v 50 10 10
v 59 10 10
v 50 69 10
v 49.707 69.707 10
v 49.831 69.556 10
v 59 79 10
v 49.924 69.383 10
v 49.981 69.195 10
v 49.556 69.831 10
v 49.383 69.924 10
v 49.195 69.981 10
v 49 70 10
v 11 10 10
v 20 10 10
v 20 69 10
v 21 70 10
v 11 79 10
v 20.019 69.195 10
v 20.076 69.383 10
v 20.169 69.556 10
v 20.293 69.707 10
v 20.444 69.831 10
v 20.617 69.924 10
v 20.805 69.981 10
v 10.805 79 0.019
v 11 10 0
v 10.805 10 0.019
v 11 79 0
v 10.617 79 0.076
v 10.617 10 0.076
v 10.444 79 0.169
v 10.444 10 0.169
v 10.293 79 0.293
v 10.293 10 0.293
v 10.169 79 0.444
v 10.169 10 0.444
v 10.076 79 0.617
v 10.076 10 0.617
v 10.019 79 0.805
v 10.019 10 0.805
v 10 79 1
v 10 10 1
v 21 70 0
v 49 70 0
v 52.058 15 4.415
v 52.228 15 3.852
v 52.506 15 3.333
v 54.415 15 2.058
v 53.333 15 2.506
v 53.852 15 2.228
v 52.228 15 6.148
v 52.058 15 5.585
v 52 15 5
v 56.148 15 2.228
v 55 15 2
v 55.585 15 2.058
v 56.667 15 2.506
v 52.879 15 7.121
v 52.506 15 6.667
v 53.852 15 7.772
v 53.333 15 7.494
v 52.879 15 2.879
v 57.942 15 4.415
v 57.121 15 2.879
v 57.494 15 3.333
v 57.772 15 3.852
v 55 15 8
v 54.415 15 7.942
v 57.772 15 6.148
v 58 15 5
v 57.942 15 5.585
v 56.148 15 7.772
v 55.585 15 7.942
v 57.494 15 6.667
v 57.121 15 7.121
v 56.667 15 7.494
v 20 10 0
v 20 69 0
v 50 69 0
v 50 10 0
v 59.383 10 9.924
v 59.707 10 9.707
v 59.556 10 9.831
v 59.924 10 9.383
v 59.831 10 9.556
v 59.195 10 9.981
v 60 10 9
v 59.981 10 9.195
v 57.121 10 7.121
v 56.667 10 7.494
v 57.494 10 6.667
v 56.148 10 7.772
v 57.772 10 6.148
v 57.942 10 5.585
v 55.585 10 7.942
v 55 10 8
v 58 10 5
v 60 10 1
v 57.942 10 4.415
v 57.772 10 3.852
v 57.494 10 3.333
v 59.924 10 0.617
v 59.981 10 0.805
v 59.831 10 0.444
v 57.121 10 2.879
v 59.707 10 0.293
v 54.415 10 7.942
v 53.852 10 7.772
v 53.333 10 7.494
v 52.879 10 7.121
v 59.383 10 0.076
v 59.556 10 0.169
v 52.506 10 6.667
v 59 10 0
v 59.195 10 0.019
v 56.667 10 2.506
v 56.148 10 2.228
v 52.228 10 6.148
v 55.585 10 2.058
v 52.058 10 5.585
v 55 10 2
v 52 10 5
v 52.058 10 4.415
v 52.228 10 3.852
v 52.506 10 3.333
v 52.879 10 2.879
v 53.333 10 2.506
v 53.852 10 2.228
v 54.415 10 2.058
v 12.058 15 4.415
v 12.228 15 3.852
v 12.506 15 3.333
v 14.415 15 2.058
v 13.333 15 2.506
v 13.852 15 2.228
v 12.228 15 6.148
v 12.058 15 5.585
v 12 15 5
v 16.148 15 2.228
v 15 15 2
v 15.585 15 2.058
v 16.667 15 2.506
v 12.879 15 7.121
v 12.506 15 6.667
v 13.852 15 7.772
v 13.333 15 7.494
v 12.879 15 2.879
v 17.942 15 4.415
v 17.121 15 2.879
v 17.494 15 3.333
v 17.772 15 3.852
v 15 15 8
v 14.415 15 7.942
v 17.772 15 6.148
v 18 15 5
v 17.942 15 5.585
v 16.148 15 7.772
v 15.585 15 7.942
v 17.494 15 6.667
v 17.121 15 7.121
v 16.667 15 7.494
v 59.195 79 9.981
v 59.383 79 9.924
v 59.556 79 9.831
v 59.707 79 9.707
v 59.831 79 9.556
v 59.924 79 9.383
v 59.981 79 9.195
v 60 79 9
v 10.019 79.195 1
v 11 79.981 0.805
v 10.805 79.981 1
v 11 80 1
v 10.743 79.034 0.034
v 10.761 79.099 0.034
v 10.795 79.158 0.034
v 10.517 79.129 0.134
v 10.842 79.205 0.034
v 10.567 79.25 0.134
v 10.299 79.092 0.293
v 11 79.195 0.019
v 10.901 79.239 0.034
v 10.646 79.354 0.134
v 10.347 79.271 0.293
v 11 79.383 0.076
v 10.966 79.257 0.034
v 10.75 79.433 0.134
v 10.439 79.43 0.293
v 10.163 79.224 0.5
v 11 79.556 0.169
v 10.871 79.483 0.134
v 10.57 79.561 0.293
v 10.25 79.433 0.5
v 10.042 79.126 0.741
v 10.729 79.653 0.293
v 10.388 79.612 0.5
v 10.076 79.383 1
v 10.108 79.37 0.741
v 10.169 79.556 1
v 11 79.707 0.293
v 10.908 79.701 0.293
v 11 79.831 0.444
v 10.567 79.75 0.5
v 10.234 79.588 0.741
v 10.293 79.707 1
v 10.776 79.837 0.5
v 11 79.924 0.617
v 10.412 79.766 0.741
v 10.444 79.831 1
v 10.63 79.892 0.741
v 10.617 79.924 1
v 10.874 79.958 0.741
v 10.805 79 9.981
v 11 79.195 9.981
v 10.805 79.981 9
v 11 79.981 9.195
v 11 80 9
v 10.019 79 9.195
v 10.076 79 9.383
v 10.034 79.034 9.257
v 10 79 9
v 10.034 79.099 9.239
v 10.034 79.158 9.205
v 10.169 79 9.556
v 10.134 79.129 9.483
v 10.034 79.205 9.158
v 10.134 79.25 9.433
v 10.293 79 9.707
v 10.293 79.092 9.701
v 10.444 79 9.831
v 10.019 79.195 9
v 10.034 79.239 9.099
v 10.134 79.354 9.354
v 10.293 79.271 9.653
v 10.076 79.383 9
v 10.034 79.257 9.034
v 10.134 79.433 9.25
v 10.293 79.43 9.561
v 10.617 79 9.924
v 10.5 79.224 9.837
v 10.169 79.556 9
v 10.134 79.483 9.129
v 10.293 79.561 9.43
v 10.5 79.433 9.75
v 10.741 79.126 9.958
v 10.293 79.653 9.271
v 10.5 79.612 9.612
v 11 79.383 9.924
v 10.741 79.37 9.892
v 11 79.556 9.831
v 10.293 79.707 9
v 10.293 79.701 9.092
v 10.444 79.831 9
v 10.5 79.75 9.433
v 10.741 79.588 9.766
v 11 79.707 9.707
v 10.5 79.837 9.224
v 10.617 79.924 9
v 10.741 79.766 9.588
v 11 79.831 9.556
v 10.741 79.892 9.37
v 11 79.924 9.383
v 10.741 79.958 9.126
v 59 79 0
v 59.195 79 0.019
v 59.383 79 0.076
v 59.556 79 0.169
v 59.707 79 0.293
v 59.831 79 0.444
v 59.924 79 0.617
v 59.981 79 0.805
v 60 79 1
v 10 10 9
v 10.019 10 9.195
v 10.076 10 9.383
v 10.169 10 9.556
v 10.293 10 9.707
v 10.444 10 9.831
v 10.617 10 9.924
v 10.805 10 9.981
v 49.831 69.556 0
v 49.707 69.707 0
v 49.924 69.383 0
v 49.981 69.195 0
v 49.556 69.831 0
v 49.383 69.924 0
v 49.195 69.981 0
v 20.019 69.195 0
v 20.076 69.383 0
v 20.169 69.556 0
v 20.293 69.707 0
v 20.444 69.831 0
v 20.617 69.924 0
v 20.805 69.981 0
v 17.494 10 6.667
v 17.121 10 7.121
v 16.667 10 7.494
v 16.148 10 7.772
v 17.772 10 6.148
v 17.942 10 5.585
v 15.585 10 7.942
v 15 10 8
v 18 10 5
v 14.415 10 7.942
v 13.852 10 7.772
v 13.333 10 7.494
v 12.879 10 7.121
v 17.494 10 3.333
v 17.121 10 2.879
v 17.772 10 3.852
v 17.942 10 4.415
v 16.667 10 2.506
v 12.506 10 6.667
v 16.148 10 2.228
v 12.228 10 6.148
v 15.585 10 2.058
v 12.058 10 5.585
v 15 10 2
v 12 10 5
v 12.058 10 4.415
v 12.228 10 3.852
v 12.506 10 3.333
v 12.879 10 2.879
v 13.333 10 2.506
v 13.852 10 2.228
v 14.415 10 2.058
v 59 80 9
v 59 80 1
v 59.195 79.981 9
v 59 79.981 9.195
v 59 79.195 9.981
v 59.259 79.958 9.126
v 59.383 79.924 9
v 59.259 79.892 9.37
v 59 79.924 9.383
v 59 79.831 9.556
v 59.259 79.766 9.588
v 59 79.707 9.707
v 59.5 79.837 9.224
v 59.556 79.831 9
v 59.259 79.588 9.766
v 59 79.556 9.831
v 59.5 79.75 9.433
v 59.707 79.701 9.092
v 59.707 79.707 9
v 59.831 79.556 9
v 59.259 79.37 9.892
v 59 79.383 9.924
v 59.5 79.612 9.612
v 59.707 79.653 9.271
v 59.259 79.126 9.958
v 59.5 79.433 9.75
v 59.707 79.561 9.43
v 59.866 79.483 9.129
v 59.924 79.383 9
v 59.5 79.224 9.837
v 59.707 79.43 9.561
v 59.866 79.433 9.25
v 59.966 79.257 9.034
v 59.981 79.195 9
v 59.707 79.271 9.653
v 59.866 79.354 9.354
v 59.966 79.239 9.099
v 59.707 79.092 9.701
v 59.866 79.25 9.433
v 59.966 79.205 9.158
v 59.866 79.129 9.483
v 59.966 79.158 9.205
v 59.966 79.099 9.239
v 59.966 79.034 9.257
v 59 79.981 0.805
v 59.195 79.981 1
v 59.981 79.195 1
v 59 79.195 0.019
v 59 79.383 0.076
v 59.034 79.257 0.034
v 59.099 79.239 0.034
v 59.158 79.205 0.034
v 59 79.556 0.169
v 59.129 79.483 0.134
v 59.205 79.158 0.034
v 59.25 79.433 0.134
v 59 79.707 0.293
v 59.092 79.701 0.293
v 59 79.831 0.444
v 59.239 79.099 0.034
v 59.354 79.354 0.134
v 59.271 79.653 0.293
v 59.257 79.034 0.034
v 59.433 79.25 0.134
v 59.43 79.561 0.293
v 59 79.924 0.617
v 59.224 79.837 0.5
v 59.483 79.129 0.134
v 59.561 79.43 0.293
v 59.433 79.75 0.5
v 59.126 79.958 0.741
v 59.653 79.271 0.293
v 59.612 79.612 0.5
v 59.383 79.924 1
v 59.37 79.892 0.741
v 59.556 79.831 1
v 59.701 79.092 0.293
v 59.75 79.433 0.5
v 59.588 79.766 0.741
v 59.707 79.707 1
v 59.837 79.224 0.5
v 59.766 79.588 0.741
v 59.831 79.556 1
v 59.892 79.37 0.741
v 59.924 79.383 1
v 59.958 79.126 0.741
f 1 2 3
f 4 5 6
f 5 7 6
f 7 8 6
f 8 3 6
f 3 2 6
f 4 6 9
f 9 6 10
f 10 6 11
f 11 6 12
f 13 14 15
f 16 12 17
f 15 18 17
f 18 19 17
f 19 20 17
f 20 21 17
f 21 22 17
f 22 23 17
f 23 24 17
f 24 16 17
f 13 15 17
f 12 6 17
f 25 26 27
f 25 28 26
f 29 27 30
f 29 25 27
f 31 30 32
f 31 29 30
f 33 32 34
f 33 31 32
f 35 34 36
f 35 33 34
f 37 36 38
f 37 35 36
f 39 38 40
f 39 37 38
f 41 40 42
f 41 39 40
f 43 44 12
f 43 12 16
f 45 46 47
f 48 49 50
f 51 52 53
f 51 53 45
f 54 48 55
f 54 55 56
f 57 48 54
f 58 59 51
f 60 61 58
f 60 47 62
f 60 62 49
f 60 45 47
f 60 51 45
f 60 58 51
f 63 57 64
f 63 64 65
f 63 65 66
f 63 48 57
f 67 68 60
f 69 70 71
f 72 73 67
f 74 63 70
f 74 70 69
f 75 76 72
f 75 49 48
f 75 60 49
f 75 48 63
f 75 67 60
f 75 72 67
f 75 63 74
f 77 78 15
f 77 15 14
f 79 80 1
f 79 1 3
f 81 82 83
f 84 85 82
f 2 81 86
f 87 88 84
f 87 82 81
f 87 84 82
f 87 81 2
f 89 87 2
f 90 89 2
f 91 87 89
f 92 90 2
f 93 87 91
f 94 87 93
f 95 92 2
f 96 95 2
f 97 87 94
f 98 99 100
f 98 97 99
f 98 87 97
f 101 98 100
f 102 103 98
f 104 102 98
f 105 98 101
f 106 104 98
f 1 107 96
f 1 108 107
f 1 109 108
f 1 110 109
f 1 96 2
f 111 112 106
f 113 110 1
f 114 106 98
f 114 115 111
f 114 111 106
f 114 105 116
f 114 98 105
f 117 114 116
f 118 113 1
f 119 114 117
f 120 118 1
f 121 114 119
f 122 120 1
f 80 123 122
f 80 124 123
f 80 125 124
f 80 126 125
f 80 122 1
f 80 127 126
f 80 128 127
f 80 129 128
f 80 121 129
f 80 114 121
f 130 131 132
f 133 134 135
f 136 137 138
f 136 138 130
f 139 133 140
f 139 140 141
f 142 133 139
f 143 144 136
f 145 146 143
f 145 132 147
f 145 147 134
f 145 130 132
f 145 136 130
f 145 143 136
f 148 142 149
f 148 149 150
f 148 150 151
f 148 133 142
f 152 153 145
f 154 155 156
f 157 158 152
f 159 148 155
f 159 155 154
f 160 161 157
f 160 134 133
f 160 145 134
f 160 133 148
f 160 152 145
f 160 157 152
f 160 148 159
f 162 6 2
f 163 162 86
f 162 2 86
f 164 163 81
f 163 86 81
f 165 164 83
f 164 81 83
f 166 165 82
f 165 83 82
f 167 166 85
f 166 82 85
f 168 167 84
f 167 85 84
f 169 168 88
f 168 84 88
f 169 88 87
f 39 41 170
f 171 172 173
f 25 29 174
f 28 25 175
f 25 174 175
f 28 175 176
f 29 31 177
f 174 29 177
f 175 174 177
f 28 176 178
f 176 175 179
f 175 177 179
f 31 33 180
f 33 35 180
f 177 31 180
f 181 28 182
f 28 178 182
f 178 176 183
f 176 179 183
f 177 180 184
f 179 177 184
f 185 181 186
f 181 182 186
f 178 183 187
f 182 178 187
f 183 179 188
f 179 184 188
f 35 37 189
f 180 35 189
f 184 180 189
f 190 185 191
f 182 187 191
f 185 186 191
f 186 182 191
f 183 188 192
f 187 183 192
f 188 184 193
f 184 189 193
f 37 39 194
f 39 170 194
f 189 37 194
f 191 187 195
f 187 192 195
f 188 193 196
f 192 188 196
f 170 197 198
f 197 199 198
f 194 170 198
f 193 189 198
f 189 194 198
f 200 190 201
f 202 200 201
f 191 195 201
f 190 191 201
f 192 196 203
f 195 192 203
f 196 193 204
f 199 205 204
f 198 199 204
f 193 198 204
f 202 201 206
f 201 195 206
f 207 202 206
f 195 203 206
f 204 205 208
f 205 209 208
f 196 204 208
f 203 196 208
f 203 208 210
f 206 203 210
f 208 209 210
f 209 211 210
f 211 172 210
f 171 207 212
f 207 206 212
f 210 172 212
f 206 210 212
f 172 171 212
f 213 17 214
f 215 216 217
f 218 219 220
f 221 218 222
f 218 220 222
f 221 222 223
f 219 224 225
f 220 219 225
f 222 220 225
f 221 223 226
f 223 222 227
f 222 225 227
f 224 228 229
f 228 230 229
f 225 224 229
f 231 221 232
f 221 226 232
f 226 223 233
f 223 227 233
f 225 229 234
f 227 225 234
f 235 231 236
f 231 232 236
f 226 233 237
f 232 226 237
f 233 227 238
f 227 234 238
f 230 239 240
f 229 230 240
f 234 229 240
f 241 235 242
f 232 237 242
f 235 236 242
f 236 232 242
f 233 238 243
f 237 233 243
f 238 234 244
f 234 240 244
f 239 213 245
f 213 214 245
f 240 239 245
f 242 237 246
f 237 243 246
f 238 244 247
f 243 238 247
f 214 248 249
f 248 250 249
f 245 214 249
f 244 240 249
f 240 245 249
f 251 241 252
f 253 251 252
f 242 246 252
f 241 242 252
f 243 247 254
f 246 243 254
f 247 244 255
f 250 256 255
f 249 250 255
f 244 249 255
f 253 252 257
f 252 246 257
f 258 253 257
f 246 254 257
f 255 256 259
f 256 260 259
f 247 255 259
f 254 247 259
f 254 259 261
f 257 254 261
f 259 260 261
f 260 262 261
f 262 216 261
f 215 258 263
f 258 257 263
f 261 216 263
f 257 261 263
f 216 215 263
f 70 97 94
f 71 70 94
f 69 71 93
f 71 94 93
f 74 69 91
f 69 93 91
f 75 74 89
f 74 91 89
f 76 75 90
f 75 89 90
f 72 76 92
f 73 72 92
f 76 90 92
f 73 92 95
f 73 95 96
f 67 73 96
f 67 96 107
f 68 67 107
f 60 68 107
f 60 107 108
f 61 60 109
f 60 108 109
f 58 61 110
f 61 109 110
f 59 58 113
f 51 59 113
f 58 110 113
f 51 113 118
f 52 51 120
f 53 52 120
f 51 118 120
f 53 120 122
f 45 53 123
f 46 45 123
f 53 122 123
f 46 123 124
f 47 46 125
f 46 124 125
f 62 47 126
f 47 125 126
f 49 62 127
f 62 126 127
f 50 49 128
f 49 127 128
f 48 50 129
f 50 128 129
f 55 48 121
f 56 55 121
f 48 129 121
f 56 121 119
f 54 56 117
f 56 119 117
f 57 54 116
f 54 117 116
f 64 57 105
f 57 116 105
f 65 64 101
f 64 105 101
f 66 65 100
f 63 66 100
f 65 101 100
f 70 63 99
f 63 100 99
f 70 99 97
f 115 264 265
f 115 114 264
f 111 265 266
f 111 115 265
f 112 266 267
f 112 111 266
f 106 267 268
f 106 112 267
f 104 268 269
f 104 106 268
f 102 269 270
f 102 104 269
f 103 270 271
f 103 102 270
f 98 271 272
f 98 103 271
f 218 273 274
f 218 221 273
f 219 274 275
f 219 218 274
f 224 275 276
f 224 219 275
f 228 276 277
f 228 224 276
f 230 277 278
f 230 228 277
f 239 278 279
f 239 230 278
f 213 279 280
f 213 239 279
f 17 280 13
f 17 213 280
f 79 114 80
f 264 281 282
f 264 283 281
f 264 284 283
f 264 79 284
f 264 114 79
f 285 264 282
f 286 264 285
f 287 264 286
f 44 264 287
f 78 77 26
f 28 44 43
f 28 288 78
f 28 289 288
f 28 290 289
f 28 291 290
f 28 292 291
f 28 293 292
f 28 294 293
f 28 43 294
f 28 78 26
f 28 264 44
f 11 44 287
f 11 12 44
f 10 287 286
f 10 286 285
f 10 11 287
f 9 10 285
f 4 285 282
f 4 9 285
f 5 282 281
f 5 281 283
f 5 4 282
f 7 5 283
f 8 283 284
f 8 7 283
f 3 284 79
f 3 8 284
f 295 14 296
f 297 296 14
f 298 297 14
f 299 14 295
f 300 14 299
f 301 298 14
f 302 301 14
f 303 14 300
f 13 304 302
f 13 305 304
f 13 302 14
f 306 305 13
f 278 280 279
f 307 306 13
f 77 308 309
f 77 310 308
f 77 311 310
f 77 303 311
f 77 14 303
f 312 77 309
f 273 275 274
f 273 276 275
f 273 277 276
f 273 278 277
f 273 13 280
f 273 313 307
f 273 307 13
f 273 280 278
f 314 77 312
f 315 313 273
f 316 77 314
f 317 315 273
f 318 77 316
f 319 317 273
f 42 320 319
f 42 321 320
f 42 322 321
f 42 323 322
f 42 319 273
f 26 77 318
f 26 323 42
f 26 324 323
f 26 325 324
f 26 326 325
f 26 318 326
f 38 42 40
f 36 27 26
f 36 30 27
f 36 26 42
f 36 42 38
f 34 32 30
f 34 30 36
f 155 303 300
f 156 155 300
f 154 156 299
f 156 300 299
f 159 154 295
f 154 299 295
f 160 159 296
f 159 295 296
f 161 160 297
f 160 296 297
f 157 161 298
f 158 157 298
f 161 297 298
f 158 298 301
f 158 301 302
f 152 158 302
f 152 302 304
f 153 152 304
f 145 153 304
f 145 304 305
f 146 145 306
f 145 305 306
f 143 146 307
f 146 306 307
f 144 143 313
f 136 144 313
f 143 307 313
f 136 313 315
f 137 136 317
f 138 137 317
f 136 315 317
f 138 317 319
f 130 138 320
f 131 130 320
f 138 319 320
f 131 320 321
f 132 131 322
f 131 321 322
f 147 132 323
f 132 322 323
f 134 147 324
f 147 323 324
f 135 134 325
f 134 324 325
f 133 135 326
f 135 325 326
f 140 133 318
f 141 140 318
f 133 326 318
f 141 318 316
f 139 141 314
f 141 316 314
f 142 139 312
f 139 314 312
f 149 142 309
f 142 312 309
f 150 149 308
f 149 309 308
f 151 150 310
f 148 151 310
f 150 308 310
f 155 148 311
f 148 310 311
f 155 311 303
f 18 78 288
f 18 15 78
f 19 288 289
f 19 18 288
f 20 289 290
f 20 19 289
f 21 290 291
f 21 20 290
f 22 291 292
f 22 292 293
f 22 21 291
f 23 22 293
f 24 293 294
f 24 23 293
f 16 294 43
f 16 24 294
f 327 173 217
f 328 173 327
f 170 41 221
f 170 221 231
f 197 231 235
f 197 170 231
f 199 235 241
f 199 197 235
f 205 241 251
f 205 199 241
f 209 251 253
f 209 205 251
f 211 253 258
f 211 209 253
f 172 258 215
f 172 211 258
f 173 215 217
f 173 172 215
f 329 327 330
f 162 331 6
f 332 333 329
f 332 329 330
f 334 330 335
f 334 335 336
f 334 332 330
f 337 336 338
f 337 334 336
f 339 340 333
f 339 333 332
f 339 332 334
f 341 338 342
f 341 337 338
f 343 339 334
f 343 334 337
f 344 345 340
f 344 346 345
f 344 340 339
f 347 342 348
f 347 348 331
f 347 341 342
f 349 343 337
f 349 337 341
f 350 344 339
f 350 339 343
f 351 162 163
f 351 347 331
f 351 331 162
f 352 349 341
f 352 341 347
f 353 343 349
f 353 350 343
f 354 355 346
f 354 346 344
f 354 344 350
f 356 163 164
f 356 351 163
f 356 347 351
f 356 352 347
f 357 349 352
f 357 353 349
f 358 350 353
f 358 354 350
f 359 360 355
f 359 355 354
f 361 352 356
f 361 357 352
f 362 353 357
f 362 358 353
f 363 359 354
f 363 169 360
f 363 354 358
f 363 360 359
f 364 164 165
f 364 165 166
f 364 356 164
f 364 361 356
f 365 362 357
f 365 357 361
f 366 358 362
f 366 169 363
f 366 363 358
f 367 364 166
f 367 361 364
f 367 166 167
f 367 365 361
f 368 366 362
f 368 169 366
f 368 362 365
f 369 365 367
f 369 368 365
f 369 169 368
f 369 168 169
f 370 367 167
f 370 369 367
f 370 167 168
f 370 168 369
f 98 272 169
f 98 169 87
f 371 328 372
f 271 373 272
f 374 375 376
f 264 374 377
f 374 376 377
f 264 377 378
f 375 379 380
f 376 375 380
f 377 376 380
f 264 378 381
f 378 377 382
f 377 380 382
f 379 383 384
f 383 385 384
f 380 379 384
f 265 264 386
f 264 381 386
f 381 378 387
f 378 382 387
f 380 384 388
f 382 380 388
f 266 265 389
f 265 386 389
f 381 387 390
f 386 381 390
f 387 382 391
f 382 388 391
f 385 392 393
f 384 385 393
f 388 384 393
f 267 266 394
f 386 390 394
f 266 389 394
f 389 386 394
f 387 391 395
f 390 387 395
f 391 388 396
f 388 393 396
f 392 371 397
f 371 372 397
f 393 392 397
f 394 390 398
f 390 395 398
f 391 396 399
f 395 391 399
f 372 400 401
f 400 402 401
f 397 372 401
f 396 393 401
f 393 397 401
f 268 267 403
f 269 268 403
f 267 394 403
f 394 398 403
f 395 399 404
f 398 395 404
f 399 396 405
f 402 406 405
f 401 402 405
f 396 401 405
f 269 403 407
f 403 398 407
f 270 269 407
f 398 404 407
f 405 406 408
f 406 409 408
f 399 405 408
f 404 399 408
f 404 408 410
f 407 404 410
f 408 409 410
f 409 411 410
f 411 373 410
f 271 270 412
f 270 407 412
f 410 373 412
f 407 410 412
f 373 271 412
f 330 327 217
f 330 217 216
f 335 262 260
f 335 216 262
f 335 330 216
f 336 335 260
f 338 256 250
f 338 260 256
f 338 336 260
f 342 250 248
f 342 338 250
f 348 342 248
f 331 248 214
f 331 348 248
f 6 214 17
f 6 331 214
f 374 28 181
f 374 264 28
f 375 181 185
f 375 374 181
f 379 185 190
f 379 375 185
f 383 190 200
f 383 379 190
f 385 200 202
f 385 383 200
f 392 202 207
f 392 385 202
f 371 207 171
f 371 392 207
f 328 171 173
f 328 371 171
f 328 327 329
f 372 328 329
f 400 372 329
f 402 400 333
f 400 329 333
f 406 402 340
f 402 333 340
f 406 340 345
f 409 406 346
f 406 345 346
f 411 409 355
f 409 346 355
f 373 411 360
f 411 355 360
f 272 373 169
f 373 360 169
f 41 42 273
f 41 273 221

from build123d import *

# Parameters (mm, degrees)
PAD_DEPTH    = 10
FILLET_R     = 1
FILLET001_R  = 1
FILLET002_R  = 1
FILLET003_R  = 1
FILLET004_R  = 1
FILLET005_R  = 1
SKETCH001_R  = 3
POCKET_DEPTH = 5


with BuildPart() as part:
    # Sketch → Pad (new body)
    with BuildSketch(Plane.XY):
        Polygon((20, 70), (20, 10), (10, 10), (10, 80), (60, 80), (60, 10), (50, 10), (50, 70), align=None)
    extrude(amount=PAD_DEPTH)

    # Fillet
    fillet_edges = [part.edges().sort_by_distance(p)[0] for p in [
        (35, 80, 10),
    ]]
    fillet(fillet_edges, radius=FILLET_R)

    # Fillet001
    fillet001_edges = [part.edges().sort_by_distance(p)[0] for p in [
        (60, 44.5, 10),
    ]]
    fillet(fillet001_edges, radius=FILLET001_R)

    # Fillet002
    fillet002_edges = [part.edges().sort_by_distance(p)[0] for p in [
        (10, 44.5, 10),
    ]]
    fillet(fillet002_edges, radius=FILLET002_R)

    # Fillet003
    fillet003_edges = [part.edges().sort_by_distance(p)[0] for p in [
        (10, 44.5, 0),
    ]]
    fillet(fillet003_edges, radius=FILLET003_R)

    # Fillet004
    fillet004_edges = [part.edges().sort_by_distance(p)[0] for p in [
        (20, 70, 5),
    ]]
    fillet(fillet004_edges, radius=FILLET004_R)

    # Fillet005
    fillet005_edges = [part.edges().sort_by_distance(p)[0] for p in [
        (50, 70, 5),
    ]]
    fillet(fillet005_edges, radius=FILLET005_R)

    # Sketch001 (on Face8 of Fillet005) → Pocket (cut)
    with BuildSketch(Plane.XZ.offset(-10)):
        with Locations((15, 5)):
            Circle(SKETCH001_R)
        with Locations((55, 5)):
            Circle(SKETCH001_R)
    extrude(amount=-POCKET_DEPTH, mode=Mode.SUBTRACT)


solid = part.part
